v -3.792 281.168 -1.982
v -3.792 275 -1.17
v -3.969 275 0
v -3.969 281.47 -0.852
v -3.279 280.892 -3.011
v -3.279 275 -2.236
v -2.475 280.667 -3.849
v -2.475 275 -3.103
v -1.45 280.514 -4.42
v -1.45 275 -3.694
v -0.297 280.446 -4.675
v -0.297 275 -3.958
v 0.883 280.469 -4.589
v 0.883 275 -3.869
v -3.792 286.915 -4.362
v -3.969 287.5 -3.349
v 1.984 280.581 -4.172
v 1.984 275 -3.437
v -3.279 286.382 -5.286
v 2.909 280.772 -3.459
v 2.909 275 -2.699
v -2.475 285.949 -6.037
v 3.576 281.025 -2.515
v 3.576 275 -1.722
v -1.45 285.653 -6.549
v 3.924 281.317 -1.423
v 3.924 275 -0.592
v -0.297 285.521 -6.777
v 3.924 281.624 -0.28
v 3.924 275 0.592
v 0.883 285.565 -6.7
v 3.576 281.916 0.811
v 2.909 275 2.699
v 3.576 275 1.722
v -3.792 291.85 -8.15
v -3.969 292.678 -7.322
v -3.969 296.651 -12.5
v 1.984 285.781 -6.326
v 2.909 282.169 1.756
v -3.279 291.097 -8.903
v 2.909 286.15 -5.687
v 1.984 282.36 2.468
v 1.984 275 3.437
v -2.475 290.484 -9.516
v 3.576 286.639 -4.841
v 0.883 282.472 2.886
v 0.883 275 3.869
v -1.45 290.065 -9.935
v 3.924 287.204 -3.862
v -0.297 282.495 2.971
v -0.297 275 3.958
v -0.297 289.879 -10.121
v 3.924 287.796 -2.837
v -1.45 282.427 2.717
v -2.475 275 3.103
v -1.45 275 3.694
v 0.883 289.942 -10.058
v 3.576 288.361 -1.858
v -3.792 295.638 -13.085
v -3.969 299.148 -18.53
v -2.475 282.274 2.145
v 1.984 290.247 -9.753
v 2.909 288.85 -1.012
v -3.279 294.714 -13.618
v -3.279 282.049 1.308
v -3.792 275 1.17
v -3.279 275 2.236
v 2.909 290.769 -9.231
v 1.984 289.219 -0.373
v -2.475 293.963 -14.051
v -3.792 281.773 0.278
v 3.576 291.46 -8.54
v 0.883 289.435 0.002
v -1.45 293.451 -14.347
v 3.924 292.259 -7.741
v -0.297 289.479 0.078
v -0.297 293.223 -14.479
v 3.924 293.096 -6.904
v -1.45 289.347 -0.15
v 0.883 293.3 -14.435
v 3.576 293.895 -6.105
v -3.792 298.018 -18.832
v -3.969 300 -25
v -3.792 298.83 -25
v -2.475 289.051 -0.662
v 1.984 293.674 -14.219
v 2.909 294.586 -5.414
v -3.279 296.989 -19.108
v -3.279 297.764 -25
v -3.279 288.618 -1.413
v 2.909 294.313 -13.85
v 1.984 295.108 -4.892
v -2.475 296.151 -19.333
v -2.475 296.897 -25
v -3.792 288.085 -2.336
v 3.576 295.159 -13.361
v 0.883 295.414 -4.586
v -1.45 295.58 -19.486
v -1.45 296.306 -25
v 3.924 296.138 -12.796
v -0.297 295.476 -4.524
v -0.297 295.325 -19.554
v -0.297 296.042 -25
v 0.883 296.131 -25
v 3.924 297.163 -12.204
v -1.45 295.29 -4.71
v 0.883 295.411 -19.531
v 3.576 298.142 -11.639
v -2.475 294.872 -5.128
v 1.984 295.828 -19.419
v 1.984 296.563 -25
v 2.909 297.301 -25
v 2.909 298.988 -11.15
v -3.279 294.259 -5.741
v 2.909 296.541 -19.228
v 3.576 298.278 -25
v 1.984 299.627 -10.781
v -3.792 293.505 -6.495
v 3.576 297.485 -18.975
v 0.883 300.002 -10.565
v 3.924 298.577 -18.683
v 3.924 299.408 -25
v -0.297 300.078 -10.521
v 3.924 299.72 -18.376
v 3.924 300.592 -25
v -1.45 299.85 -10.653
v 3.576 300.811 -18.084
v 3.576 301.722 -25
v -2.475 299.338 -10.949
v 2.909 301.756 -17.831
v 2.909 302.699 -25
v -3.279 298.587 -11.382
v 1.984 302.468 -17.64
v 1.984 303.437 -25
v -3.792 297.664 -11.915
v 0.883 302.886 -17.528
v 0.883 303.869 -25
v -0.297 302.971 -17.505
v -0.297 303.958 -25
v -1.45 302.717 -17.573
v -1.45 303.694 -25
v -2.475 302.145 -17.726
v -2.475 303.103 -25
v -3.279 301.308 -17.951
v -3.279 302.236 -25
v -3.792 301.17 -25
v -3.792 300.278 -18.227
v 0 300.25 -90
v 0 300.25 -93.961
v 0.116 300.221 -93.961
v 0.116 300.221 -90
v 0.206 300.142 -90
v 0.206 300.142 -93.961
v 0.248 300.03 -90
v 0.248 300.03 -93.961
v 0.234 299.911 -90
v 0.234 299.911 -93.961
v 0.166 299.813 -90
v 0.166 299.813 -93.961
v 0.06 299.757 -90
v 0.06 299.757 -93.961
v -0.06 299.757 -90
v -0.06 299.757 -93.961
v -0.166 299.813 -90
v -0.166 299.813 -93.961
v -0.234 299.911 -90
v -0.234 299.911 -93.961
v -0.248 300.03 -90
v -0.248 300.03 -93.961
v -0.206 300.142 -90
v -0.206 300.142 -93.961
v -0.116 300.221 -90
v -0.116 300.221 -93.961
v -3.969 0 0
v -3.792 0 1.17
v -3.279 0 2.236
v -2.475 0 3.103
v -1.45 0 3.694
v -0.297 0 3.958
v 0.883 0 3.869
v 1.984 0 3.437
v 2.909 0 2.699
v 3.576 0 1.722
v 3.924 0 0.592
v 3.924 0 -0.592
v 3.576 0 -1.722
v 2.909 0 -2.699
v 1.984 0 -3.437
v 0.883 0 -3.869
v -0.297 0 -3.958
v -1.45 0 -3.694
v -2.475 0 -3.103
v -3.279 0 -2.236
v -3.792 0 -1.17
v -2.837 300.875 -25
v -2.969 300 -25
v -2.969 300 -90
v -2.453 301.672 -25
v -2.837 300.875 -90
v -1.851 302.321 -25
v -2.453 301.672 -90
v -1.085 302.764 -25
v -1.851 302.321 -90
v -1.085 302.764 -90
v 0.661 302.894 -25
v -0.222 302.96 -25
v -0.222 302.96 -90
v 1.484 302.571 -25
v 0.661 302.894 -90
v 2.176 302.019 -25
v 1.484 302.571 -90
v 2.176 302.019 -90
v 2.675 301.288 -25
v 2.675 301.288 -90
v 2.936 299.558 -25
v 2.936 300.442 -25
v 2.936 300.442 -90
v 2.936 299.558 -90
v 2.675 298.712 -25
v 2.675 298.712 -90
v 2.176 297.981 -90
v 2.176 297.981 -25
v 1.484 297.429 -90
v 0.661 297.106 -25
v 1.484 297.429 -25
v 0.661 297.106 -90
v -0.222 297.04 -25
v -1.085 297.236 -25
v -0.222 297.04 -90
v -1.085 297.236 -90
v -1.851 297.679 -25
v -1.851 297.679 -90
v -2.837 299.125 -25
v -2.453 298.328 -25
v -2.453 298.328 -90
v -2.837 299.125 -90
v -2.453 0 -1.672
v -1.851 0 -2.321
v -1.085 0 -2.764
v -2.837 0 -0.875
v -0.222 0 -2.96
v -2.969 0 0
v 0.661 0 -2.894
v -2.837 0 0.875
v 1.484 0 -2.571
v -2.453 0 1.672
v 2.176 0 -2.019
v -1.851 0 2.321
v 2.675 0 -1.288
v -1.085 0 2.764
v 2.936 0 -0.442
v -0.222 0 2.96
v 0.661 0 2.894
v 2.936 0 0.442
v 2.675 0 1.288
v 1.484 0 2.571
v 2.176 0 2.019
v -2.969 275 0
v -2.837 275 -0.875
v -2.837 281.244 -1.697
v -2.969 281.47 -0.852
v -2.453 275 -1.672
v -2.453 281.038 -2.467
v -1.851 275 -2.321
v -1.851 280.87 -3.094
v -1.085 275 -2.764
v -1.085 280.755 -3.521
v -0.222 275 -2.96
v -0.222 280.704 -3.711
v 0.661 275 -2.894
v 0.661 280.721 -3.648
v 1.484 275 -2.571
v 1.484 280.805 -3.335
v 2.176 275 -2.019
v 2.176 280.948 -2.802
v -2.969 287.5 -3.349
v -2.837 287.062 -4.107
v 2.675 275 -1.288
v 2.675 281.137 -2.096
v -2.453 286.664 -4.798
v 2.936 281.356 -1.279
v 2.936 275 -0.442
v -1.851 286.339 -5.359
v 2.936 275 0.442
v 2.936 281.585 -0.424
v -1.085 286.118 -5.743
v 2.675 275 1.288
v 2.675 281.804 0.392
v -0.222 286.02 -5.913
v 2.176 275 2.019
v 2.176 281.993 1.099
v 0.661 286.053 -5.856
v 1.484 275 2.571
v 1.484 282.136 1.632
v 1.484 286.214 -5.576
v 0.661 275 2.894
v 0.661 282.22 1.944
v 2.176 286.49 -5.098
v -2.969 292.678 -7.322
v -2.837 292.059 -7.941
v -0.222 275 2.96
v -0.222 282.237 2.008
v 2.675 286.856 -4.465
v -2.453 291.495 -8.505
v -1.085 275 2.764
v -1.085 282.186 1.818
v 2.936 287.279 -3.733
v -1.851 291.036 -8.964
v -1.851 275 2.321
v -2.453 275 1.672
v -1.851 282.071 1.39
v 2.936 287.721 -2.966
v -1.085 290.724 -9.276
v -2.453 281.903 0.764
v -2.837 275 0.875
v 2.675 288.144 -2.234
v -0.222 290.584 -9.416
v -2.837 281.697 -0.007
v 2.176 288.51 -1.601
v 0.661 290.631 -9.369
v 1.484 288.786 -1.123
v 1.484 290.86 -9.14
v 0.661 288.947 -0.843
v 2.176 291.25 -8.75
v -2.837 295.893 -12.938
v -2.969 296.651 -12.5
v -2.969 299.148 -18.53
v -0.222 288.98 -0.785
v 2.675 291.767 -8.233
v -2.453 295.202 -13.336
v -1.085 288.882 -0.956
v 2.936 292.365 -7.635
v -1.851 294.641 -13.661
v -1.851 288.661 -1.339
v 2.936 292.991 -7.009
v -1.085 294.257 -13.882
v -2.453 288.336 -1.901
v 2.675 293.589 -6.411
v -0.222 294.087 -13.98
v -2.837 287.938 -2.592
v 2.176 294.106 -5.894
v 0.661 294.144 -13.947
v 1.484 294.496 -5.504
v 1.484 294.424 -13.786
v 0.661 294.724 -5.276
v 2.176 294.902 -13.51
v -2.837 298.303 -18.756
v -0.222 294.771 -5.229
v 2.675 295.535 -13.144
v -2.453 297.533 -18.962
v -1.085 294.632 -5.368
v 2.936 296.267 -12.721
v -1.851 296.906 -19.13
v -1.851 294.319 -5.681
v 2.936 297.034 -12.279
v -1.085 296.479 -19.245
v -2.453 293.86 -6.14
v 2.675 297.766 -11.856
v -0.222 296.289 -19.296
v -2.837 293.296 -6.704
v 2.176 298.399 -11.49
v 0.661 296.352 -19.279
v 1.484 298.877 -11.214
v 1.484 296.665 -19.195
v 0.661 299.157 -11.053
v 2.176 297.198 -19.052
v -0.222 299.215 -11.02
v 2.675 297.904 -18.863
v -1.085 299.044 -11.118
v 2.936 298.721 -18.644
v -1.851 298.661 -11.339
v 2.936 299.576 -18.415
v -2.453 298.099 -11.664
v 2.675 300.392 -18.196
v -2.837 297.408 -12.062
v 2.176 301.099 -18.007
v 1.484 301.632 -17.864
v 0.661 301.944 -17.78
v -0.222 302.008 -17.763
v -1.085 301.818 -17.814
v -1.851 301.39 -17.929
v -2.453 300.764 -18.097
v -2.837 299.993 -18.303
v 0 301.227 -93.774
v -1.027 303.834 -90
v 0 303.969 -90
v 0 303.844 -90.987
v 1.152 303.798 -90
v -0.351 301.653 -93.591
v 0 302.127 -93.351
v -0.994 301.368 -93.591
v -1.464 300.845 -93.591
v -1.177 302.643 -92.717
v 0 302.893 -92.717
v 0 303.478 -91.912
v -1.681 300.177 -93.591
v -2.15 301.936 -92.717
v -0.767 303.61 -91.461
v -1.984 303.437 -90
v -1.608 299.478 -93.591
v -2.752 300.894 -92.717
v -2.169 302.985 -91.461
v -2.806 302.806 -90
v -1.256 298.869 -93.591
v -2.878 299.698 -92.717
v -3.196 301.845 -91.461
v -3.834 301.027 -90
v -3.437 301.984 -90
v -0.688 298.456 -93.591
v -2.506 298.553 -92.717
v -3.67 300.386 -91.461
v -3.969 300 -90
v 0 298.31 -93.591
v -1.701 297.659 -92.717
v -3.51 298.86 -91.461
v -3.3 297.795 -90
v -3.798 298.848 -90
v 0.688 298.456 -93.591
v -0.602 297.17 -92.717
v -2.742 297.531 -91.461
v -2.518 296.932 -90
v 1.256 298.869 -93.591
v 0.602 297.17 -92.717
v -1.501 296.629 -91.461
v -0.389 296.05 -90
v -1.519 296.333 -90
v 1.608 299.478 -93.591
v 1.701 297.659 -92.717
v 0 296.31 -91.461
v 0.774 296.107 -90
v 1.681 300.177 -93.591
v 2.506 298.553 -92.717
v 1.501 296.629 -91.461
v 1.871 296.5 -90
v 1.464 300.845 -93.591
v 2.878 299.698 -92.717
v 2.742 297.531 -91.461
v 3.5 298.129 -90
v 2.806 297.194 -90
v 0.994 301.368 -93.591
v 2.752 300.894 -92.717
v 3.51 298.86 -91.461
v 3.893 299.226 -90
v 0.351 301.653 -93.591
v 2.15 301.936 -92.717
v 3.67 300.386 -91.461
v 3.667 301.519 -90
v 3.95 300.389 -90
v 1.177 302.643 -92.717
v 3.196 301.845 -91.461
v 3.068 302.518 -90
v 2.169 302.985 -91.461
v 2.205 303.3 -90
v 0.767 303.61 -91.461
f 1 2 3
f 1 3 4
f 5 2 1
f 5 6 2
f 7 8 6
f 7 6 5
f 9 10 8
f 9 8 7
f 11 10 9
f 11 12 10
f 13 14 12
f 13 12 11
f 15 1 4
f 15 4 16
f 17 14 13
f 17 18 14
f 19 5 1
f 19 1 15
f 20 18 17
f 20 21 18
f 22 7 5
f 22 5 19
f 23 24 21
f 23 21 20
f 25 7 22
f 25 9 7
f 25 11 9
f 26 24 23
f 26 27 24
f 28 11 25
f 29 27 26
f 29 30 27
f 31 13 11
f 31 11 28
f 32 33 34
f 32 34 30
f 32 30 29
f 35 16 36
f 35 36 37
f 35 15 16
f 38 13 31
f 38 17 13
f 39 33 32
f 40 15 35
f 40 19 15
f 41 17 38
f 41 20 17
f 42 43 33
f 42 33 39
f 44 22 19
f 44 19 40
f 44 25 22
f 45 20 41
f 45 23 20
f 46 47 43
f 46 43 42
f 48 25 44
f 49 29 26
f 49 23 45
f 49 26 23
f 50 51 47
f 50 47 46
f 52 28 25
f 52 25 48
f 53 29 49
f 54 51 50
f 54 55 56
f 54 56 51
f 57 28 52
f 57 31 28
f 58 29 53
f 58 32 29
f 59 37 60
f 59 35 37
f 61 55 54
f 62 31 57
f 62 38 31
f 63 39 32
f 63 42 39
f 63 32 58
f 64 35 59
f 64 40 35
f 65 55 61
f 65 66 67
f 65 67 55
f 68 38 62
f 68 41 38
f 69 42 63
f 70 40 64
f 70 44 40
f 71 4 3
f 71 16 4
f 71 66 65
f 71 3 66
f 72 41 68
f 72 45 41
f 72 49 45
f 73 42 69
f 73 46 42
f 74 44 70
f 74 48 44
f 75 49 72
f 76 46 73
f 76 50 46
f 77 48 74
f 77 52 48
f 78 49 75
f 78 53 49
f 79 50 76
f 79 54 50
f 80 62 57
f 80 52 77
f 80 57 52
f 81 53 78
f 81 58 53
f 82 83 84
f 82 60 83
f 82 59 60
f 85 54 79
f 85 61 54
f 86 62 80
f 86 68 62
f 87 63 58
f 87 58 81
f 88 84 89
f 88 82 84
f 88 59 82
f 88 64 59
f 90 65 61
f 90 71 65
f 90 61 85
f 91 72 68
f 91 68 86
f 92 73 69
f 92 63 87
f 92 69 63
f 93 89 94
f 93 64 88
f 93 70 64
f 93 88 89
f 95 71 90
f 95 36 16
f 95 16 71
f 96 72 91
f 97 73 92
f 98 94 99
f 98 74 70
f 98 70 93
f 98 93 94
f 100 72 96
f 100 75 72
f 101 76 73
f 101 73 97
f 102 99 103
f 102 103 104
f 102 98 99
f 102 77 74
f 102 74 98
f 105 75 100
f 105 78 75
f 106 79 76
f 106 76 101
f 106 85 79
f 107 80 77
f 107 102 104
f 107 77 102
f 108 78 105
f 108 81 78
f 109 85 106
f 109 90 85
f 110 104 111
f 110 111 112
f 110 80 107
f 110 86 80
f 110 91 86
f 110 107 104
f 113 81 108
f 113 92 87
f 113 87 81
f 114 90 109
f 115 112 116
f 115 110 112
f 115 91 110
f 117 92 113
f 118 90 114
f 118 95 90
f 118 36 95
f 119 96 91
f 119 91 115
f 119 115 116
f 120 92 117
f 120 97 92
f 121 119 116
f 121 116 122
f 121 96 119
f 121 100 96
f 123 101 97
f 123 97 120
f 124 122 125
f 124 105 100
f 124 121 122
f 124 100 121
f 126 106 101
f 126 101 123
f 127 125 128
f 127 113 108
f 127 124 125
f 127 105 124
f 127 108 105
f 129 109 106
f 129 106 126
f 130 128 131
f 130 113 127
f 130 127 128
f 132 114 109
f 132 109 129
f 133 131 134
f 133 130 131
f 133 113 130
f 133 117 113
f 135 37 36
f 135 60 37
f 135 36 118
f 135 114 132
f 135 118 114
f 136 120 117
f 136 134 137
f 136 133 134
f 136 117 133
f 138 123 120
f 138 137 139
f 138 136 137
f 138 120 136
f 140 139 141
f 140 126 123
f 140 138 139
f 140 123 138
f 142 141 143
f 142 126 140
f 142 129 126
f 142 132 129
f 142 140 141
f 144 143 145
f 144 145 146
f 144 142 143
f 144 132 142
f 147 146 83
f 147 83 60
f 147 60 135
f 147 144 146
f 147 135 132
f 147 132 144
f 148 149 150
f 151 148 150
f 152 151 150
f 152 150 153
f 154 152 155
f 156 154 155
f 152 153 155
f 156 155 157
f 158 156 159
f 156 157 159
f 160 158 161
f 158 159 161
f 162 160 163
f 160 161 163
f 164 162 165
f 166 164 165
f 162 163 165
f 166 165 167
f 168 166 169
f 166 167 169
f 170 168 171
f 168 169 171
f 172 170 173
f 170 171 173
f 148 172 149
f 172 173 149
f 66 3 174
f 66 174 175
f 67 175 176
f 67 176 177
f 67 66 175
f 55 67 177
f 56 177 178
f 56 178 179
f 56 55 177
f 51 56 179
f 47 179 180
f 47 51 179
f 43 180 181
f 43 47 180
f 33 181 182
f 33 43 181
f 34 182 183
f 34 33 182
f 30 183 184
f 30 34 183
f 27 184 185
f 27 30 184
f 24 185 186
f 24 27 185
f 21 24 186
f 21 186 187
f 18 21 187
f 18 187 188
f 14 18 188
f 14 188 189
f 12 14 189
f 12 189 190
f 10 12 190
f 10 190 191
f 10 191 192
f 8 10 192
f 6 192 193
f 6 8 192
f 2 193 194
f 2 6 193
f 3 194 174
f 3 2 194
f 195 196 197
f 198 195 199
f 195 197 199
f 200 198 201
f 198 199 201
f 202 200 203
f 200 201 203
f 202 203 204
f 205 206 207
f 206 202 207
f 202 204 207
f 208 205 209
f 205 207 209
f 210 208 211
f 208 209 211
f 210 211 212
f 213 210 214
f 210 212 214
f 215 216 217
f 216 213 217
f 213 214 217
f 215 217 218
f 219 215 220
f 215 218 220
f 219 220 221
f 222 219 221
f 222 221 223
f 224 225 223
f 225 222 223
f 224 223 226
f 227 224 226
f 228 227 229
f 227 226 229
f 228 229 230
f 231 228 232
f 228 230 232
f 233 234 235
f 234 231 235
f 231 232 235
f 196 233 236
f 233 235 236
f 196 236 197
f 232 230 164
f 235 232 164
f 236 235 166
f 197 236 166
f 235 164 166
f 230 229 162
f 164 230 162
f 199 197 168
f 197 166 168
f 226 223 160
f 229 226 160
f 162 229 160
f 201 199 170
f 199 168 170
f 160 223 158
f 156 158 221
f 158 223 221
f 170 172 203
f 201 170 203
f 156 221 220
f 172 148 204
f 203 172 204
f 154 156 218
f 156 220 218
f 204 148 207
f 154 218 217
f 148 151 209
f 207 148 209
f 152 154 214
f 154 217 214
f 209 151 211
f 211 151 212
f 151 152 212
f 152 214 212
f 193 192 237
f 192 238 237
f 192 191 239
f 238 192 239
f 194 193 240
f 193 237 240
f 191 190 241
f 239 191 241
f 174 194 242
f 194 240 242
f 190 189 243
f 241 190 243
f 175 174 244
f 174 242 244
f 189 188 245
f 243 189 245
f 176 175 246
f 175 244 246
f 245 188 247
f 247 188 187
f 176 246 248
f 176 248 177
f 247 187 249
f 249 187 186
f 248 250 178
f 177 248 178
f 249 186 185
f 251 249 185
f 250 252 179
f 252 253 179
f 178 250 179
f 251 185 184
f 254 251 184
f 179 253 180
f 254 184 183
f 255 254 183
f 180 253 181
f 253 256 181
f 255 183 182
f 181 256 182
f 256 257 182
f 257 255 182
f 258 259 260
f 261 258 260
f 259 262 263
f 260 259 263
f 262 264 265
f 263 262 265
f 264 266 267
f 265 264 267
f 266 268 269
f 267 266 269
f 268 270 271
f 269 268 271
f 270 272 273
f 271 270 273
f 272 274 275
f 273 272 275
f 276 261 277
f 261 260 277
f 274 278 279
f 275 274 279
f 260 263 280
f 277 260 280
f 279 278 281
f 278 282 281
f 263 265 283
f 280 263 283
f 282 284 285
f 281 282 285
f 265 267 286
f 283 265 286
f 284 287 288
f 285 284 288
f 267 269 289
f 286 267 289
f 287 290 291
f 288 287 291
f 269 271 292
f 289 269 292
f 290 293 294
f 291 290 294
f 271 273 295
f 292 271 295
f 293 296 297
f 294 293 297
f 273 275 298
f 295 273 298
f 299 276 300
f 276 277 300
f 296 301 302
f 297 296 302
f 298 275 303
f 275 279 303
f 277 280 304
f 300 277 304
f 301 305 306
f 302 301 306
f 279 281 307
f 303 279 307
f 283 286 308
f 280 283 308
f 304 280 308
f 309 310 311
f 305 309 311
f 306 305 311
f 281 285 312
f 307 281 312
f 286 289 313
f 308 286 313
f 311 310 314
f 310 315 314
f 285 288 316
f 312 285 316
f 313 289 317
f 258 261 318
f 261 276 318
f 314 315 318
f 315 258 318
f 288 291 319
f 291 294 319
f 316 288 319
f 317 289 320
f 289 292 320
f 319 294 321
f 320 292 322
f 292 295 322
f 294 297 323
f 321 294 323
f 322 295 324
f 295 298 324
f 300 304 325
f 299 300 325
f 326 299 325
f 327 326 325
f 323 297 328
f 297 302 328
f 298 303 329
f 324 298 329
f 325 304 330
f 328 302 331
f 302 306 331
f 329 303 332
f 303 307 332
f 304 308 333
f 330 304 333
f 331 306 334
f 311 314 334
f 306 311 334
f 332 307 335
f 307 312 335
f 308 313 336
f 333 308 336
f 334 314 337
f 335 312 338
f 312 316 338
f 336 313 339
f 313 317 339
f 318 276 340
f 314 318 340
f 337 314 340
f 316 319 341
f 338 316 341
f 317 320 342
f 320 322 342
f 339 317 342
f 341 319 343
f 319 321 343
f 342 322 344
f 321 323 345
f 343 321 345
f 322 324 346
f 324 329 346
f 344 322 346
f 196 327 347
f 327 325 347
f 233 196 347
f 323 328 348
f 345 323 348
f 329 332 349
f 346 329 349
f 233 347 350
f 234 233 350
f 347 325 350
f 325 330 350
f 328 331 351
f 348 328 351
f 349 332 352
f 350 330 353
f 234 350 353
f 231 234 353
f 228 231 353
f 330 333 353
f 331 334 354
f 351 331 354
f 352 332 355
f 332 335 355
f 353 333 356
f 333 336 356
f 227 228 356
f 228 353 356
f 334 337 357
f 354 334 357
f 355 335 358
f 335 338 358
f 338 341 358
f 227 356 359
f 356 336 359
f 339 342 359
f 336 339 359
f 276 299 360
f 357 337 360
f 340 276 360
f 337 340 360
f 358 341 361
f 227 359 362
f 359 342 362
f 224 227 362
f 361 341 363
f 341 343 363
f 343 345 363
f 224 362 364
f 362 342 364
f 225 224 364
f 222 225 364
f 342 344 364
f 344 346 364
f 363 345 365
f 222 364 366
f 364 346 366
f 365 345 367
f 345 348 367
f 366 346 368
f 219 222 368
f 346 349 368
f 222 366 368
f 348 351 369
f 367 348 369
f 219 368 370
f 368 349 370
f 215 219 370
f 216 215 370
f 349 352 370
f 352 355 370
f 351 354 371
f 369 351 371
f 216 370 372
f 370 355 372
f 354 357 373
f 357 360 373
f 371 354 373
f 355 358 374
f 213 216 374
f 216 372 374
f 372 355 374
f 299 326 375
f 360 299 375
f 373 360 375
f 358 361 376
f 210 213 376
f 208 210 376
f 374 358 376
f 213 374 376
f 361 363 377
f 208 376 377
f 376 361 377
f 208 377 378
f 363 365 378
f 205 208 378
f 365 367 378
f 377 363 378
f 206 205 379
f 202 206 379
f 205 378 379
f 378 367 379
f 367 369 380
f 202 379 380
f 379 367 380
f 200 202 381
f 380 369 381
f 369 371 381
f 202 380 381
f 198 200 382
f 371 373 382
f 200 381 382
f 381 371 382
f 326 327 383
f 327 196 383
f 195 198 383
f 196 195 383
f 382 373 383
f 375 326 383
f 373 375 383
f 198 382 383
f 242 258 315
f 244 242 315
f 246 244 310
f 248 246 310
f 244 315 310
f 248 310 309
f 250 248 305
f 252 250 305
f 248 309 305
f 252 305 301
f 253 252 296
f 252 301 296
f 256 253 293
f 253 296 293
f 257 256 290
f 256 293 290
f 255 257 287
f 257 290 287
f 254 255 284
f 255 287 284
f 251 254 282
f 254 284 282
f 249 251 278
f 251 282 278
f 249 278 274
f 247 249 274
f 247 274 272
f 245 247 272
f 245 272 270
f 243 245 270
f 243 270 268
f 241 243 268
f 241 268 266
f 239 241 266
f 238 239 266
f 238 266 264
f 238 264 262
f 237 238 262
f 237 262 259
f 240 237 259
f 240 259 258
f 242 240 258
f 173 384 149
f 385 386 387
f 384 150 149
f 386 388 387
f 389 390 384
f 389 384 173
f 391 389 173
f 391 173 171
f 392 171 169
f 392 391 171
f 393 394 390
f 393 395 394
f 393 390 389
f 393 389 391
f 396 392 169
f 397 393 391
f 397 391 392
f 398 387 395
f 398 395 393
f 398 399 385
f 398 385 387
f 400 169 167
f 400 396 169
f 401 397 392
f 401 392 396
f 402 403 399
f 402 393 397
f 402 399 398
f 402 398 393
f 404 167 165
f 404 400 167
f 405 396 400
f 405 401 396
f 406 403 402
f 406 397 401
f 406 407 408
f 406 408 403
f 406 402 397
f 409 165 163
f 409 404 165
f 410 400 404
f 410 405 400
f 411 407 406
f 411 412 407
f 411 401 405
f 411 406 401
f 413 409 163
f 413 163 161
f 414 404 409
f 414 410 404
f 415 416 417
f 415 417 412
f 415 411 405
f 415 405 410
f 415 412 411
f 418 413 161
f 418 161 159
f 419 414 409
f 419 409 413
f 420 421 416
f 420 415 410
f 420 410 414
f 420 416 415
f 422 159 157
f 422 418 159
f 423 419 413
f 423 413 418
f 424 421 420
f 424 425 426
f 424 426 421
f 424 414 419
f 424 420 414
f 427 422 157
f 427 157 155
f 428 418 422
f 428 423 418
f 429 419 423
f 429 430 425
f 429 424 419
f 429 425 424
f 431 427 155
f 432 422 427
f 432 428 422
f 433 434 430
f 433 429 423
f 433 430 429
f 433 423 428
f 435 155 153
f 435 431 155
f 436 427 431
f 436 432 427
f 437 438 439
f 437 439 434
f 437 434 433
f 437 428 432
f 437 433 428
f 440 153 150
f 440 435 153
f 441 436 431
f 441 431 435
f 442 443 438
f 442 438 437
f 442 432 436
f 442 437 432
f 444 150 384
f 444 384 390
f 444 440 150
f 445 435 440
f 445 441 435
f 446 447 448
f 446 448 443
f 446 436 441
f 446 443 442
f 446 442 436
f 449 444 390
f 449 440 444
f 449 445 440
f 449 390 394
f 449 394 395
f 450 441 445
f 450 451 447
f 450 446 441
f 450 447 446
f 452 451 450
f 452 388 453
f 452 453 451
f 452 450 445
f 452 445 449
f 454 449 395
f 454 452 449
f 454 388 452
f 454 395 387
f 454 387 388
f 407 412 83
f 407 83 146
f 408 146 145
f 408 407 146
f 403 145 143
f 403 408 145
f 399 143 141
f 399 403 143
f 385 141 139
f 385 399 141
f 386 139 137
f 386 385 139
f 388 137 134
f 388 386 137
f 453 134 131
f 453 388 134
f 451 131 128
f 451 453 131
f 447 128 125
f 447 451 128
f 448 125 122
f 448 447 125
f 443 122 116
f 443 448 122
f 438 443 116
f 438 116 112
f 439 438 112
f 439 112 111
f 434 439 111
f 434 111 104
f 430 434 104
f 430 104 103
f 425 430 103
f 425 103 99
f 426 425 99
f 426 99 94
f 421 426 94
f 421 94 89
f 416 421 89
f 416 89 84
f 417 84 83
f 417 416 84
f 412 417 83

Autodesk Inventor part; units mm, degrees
ref_plane "YZ Plane" through (0, 0, 0) normal (1, 0, 0) x (0, 1, 0)
ref_plane "XZ Plane" through (0, 0, 0) normal (0, 1, 0) x (-1, 0, 0)
ref_plane "XY Plane" through (0, 0, 0) normal (0, 0, 1) x (1, 0, 0)
sketch "Sketch1" plane through (0, 0, 0) normal (0, 1, 0) x (-1, 0, 0)
  circle A0 centre (0, 0) radius 3.9688
  circle A1 centre (0, 0) radius 2.9688
  dimension "d0" = 7.9375
  dimension "d4" = 1
sketch "Sketch2" plane through (0, 0, 0) normal (1, 0, 0) x (0, 1, 0)
  line L0 (0, 0) -> (275, 0)
  line L1 (300, -25) -> (300, -90)
  arc A0 (300, -25) -> (275, 0) centre (275, -25) ccw
  point P0 (300, 0)
  dimension "d1" = 300
  dimension "d2" = 90
  dimension "d3" = 25
sweep "Sweep1" add profiles "Sketch1" path "Sketch2"
sketch "Sketch3" plane through (0, 0, 0) normal (1, 0, 0) x (0, 1, 0)
  line L0 (296.0312, -90) -> (303.9688, -90) projected
  arc A0 (300.25, -93.9609) -> (299.75, -93.9609) centre (300, -90) ccw
  line L1 (300, -90) -> (300, -93.9688)
  line L2 (300.25, -90) -> (300.25, -93.9609)
  line L3 (299.75, -90) -> (299.75, -93.9609)
  point P0 (0, 0)
  point P1 (300.25, -96.7948)
  point P2 (299.75, -96.7948)
  dimension "d7" = 0.25
revolve "Revolution1" add sketch "Sketch3" angle 360 about axis through (0, 300, -90) along (0, 0, -1) contours A0 L2 L0
properties part number "Pitot Tube" material "Stainless Steel"
